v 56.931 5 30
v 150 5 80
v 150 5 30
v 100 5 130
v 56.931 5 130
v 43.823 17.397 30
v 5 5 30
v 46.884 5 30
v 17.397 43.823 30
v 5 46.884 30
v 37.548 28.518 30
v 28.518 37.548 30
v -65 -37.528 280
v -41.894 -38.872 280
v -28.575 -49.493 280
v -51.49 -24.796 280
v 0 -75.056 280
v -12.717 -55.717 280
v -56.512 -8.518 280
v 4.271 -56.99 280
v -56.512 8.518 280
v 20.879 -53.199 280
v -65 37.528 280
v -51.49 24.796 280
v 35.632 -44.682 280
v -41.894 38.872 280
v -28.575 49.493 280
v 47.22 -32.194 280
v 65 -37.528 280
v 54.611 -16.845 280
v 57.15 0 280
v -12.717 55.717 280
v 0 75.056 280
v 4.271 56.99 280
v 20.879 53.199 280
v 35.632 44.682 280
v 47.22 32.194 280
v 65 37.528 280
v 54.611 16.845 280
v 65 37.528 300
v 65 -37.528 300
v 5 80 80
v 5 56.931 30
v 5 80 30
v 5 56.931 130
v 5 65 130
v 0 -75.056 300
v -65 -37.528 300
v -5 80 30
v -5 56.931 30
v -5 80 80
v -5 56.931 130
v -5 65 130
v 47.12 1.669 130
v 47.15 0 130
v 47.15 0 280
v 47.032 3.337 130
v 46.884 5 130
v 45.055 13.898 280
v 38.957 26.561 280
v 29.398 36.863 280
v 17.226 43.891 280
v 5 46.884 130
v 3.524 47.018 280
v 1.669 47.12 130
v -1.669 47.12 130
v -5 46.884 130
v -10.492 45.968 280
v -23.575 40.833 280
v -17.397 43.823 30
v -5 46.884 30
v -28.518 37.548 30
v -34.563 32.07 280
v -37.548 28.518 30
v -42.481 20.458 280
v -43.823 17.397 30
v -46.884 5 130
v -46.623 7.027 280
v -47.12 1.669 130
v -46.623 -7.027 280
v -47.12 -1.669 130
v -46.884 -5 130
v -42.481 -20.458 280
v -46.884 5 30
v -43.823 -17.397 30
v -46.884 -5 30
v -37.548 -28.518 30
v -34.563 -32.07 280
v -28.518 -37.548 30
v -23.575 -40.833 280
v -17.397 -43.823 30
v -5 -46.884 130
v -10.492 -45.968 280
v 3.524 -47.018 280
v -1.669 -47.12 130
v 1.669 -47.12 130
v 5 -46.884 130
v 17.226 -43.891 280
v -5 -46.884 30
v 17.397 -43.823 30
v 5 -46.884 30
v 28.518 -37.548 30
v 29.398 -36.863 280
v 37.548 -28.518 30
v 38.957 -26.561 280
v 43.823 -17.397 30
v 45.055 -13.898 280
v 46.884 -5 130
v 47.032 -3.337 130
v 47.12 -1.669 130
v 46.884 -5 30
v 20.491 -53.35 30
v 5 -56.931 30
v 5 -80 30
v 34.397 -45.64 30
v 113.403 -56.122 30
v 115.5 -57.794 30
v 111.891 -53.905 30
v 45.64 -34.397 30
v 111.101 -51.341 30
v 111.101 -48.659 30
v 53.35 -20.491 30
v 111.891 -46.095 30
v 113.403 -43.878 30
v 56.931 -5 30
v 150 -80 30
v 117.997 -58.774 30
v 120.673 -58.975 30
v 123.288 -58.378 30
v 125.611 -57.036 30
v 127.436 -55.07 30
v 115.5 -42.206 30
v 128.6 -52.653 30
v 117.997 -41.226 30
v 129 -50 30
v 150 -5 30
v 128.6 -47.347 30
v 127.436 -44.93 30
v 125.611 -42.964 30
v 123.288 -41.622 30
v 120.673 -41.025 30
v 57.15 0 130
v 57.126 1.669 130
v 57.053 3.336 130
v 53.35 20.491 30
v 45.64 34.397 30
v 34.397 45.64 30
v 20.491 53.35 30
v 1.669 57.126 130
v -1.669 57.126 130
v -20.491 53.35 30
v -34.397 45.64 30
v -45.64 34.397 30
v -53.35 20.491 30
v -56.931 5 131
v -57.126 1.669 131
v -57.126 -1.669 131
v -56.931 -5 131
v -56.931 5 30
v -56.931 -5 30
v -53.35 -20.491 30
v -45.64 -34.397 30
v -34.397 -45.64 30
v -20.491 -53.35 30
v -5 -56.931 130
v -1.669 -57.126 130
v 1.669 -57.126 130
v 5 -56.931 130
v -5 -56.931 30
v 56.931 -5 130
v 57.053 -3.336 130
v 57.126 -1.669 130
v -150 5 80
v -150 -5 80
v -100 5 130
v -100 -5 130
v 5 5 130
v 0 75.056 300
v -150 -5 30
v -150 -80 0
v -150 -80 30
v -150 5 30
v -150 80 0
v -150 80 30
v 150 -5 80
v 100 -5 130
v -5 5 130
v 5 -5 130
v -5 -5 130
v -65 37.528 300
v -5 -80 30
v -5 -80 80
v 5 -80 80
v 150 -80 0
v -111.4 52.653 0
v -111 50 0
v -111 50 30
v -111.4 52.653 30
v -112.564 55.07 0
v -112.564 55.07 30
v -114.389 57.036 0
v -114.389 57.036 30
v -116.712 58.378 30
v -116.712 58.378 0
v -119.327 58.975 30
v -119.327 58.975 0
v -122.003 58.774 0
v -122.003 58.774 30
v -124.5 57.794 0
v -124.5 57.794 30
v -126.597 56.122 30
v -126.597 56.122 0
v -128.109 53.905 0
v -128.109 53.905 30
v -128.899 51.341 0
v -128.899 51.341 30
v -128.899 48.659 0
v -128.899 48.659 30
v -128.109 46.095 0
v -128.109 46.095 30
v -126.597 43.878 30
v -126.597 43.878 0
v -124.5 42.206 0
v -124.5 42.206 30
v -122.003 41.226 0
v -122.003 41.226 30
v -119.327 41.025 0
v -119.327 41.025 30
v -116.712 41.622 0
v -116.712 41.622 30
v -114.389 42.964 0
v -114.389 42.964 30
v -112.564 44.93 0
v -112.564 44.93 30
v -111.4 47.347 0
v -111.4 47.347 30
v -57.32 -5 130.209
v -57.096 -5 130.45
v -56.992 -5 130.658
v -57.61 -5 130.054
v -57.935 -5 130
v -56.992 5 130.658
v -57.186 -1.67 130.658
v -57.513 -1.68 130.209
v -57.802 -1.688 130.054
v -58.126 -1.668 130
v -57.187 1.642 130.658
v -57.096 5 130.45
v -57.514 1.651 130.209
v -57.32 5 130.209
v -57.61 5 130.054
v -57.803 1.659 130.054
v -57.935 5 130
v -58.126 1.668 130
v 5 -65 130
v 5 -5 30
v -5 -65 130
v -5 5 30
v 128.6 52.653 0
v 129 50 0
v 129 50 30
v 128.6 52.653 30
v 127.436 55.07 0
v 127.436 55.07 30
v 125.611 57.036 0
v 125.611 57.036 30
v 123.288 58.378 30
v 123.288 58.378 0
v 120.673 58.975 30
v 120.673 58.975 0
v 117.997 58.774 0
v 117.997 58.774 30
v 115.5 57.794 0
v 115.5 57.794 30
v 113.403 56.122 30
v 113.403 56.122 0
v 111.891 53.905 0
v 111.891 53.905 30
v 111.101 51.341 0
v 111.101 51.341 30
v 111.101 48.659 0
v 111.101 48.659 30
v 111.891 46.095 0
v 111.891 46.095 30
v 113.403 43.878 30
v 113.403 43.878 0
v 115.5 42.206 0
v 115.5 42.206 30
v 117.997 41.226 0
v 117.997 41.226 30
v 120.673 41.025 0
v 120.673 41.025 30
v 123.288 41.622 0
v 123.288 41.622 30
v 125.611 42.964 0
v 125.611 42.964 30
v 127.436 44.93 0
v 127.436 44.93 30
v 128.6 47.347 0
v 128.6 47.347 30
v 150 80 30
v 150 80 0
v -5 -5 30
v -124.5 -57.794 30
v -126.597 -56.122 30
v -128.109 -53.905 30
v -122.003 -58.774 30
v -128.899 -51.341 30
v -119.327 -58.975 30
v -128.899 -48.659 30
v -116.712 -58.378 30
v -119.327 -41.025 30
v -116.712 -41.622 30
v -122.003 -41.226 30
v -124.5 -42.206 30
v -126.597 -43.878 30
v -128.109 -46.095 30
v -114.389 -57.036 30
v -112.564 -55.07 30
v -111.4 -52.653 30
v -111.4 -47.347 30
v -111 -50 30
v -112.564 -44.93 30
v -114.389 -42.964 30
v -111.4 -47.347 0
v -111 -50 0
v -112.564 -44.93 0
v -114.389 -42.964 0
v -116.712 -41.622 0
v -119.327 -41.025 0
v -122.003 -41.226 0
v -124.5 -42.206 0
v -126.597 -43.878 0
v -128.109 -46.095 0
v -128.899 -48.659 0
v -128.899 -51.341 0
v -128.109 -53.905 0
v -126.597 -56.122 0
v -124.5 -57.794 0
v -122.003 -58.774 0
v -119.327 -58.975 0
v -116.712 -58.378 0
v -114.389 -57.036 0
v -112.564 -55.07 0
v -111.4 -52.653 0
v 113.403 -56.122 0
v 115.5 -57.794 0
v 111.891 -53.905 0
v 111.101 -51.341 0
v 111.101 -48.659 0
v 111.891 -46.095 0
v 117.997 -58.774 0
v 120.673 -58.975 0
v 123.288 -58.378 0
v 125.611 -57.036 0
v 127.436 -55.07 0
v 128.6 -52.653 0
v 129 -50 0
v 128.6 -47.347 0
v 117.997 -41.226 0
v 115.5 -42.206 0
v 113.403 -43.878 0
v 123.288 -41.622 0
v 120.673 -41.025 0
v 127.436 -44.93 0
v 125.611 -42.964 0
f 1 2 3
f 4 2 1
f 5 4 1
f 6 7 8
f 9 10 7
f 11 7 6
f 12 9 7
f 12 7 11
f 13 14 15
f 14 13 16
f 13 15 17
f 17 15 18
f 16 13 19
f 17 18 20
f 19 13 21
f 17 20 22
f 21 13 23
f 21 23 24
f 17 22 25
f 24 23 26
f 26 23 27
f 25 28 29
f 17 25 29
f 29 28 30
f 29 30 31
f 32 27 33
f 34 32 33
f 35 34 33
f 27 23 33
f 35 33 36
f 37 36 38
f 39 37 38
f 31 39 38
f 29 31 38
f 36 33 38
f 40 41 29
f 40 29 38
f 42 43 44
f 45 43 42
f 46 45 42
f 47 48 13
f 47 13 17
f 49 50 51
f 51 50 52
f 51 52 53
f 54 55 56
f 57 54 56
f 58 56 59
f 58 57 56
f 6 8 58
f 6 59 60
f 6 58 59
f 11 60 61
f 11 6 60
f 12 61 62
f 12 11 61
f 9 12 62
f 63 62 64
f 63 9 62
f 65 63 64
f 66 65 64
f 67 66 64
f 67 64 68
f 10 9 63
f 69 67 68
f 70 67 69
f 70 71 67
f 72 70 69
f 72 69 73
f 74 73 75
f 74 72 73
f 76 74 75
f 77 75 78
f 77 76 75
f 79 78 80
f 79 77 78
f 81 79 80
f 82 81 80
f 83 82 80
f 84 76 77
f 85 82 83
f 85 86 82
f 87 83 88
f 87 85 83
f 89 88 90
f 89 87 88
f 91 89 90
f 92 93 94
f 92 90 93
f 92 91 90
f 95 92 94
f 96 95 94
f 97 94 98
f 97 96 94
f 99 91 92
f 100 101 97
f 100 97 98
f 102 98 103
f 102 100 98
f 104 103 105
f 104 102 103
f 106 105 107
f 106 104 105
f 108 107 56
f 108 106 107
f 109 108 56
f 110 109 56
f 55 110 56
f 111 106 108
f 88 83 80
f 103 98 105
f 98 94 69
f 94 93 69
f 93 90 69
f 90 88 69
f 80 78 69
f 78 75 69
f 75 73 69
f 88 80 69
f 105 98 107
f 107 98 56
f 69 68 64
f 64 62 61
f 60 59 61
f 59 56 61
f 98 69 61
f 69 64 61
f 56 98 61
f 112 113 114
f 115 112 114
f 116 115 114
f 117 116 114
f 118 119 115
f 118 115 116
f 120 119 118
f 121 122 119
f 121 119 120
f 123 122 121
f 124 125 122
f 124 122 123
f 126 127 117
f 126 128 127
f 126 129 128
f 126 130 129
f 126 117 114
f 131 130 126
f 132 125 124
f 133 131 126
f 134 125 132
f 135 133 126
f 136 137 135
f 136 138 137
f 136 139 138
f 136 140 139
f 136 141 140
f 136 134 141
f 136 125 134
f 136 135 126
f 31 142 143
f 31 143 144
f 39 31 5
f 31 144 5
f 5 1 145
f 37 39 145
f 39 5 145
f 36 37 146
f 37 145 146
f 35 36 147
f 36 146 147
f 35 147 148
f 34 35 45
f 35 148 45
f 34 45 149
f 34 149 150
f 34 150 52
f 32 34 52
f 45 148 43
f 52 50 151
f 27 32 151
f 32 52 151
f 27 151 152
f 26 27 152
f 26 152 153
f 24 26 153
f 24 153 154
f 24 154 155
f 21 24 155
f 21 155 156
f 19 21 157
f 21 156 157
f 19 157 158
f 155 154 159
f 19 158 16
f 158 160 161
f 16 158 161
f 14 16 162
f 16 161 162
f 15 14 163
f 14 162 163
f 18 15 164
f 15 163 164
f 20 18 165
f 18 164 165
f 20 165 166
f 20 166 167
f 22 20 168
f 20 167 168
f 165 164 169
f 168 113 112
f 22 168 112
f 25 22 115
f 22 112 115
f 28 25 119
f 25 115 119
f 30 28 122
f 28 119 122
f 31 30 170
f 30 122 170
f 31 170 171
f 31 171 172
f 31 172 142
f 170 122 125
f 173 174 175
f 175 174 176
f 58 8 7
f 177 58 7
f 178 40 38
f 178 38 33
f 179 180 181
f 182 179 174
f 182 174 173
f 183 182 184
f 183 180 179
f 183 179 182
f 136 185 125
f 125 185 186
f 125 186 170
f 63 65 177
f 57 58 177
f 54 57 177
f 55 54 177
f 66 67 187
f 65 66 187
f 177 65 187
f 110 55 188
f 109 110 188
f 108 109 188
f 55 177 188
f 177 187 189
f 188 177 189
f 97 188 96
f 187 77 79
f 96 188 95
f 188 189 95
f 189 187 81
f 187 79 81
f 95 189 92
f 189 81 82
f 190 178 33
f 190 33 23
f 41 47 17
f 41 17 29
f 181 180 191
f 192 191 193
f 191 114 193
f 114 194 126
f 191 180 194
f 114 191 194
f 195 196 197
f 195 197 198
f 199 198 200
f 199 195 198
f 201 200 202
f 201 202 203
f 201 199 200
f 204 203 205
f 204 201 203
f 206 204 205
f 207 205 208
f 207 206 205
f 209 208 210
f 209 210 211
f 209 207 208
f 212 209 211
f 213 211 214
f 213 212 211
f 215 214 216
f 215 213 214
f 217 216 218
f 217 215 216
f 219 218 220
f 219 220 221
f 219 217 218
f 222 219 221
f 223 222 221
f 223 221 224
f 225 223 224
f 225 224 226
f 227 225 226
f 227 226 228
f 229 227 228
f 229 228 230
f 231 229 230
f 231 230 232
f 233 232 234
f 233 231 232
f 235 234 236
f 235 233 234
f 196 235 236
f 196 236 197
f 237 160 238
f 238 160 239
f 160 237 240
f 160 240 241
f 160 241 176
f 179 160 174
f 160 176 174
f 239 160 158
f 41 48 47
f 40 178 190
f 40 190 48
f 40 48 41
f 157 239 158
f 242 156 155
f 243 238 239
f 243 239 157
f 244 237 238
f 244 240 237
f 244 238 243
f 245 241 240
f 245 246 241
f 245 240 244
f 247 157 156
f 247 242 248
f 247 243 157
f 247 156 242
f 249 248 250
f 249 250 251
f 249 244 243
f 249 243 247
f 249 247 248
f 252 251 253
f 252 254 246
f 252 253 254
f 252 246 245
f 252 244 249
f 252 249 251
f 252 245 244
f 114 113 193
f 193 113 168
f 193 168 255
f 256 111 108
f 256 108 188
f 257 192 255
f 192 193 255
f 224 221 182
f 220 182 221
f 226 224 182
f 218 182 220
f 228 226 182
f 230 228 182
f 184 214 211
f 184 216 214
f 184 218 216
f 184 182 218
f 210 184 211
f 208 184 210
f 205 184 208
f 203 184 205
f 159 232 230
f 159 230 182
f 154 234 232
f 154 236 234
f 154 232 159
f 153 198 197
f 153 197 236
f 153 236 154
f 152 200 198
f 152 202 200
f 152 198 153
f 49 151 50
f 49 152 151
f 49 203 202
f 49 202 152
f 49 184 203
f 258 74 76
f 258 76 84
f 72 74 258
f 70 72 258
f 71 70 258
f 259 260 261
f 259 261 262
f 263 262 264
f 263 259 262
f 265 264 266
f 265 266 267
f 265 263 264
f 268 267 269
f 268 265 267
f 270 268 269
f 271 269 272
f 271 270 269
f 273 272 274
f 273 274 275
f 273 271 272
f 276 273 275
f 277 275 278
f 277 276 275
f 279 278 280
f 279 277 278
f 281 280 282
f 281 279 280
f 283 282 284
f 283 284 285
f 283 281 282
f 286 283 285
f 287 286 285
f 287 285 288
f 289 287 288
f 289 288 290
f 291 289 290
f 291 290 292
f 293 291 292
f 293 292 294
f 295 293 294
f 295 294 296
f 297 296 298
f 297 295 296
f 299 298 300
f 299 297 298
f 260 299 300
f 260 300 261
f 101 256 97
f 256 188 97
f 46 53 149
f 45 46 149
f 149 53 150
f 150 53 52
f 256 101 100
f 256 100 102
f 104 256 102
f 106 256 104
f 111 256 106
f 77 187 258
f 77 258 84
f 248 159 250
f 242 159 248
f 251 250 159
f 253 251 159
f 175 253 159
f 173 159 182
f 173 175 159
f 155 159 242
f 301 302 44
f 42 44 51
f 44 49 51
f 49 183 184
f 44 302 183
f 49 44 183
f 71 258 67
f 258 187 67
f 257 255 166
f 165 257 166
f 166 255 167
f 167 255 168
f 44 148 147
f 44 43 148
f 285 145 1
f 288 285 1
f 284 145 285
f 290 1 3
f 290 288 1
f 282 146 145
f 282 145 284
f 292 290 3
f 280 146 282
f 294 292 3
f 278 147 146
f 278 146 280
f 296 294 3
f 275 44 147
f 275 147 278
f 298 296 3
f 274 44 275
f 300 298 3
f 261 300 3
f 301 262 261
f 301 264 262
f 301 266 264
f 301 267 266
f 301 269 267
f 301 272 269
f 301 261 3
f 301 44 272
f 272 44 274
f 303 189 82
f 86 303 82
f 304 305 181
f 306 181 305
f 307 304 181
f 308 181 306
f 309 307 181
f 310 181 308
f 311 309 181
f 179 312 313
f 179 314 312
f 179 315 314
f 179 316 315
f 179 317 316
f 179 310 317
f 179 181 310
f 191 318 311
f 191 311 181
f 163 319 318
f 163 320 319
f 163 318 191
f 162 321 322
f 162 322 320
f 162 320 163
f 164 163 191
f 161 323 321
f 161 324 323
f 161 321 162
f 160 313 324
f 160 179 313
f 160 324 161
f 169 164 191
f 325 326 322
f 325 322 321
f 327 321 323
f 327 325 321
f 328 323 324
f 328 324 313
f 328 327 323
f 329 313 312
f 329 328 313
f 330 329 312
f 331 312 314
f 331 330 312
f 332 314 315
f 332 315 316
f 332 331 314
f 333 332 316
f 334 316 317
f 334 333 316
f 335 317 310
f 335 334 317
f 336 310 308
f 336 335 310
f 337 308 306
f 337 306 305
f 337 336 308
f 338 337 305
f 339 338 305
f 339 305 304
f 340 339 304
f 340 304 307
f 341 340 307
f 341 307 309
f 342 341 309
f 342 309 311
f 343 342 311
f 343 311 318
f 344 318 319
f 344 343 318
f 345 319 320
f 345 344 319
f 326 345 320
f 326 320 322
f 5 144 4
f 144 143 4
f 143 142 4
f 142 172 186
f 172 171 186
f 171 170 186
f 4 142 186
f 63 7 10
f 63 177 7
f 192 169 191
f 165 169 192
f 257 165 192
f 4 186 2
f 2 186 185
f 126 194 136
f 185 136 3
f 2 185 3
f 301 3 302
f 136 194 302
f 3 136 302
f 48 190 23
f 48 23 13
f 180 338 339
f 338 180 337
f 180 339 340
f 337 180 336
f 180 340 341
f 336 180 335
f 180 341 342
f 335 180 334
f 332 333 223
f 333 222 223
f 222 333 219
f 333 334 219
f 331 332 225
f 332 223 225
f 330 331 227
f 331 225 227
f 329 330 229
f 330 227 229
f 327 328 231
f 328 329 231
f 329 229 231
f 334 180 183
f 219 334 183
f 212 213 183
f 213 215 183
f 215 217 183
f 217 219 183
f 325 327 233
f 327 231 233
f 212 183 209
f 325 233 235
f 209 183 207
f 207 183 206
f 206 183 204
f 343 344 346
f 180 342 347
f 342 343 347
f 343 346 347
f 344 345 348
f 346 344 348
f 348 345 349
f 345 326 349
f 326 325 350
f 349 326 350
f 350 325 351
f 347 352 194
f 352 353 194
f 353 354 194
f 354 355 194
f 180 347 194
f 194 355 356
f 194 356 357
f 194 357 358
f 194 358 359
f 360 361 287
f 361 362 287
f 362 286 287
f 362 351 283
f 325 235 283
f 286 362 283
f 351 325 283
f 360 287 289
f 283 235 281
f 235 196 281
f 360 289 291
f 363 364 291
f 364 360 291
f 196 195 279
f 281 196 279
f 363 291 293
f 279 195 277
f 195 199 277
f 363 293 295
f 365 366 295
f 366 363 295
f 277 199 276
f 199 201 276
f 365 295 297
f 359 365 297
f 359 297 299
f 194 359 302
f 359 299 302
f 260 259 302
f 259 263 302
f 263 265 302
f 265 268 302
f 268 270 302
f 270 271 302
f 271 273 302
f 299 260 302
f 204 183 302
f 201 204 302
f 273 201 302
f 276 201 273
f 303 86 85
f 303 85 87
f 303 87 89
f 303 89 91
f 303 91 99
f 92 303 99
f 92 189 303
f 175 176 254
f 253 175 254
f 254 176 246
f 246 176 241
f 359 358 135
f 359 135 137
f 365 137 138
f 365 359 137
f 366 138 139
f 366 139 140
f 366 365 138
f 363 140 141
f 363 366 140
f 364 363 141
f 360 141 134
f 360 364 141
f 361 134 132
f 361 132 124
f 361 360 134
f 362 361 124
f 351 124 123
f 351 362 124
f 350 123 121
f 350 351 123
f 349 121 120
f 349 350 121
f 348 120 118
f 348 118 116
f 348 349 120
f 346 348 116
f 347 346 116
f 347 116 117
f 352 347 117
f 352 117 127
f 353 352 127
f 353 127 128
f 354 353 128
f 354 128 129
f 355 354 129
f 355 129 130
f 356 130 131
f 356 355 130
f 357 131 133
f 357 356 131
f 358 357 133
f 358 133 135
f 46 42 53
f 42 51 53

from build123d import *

# Parameters (mm, degrees)
EXTRUDE004_DEPTH      = 20
EXTRUDE001_DEPTH      = 5
SKETCH002_R           = 57.15
SKETCH002_R_2         = 47.15
EXTRUDE002_DEPTH      = 270
EXTRUDE003_DEPTH      = 5
CLONE_PLACEMENT_ANGLE = 180
SKETCH_W              = 300
SKETCH_H              = 160
SKETCH_R              = 9
EXTRUDE_DEPTH         = 30
FILLET_R              = 1


with BuildPart() as lastplatte:
    # Sketch004 (on Face26 of Fusion) → Extrude004 (new body)
    with BuildSketch(Plane.XY.offset(300)):
        Polygon((65, 37.527767), (0, 75.055535), (-65, 37.527767), (-65, -37.527767), (0, -75.055535), (65, -37.527767), align=None)
    extrude(amount=-EXTRUDE004_DEPTH)


with BuildPart() as steife1:
    # Sketch001 → Extrude001 (new body, symmetric)
    with BuildSketch(Plane.XZ):
        Polygon((150, 30), (-150, 30), (-150, 80), (-100, 130), (100, 130), (150, 80), align=None)
    extrude(amount=EXTRUDE001_DEPTH, both=True)


with BuildPart() as r114x10:
    # Sketch002 (on Face10 of Extrude) → Extrude002 (new body)
    with BuildSketch(Plane.XY.offset(30)):
        Circle(SKETCH002_R)
        Circle(SKETCH002_R_2, mode=Mode.SUBTRACT)
    extrude(amount=EXTRUDE002_DEPTH)


with BuildPart() as steife2:
    # Sketch003 → Extrude003 (new body, symmetric)
    with BuildSketch(Plane.YZ):
        Polygon((-80, 30), (-80, 80), (-65, 130), (-5, 130), (-5, 30), align=None)
    extrude(amount=EXTRUDE003_DEPTH, both=True)


with BuildPart() as steife003:
    # Clone base: copy of steife2
    add(steife2.part)


with BuildPart() as steife003_1:
    # Clone placement: moved
    add(steife003.part.rotate(Axis((0, 0, 0), (0, 0, 1)), CLONE_PLACEMENT_ANGLE))


with BuildPart() as fillet_body:
    # Sketch → Extrude (new body)
    with BuildSketch(Plane.XY):
        Rectangle(SKETCH_W, SKETCH_H)
        with Locations((-120, 50)):
            Circle(SKETCH_R, mode=Mode.SUBTRACT)
        with Locations((120, 50)):
            Circle(SKETCH_R, mode=Mode.SUBTRACT)
        with Locations((120, -50)):
            Circle(SKETCH_R, mode=Mode.SUBTRACT)
        with Locations((-120, -50)):
            Circle(SKETCH_R, mode=Mode.SUBTRACT)
    extrude(amount=EXTRUDE_DEPTH)

    # Fusion: union steife1, R114x10, steife2, steife003
    add(steife1.part)
    add(r114x10.part)
    add(steife2.part)
    add(steife003_1.part)

    # Fusion001: union lastplatte
    add(lastplatte.part)

    # Fillet
    fillet_edges = [fillet_body.edges().sort_by_distance(p)[0] for p in [
        (-57.15, 0, 130),
    ]]
    fillet(fillet_edges, radius=FILLET_R)


solid = fillet_body.part
